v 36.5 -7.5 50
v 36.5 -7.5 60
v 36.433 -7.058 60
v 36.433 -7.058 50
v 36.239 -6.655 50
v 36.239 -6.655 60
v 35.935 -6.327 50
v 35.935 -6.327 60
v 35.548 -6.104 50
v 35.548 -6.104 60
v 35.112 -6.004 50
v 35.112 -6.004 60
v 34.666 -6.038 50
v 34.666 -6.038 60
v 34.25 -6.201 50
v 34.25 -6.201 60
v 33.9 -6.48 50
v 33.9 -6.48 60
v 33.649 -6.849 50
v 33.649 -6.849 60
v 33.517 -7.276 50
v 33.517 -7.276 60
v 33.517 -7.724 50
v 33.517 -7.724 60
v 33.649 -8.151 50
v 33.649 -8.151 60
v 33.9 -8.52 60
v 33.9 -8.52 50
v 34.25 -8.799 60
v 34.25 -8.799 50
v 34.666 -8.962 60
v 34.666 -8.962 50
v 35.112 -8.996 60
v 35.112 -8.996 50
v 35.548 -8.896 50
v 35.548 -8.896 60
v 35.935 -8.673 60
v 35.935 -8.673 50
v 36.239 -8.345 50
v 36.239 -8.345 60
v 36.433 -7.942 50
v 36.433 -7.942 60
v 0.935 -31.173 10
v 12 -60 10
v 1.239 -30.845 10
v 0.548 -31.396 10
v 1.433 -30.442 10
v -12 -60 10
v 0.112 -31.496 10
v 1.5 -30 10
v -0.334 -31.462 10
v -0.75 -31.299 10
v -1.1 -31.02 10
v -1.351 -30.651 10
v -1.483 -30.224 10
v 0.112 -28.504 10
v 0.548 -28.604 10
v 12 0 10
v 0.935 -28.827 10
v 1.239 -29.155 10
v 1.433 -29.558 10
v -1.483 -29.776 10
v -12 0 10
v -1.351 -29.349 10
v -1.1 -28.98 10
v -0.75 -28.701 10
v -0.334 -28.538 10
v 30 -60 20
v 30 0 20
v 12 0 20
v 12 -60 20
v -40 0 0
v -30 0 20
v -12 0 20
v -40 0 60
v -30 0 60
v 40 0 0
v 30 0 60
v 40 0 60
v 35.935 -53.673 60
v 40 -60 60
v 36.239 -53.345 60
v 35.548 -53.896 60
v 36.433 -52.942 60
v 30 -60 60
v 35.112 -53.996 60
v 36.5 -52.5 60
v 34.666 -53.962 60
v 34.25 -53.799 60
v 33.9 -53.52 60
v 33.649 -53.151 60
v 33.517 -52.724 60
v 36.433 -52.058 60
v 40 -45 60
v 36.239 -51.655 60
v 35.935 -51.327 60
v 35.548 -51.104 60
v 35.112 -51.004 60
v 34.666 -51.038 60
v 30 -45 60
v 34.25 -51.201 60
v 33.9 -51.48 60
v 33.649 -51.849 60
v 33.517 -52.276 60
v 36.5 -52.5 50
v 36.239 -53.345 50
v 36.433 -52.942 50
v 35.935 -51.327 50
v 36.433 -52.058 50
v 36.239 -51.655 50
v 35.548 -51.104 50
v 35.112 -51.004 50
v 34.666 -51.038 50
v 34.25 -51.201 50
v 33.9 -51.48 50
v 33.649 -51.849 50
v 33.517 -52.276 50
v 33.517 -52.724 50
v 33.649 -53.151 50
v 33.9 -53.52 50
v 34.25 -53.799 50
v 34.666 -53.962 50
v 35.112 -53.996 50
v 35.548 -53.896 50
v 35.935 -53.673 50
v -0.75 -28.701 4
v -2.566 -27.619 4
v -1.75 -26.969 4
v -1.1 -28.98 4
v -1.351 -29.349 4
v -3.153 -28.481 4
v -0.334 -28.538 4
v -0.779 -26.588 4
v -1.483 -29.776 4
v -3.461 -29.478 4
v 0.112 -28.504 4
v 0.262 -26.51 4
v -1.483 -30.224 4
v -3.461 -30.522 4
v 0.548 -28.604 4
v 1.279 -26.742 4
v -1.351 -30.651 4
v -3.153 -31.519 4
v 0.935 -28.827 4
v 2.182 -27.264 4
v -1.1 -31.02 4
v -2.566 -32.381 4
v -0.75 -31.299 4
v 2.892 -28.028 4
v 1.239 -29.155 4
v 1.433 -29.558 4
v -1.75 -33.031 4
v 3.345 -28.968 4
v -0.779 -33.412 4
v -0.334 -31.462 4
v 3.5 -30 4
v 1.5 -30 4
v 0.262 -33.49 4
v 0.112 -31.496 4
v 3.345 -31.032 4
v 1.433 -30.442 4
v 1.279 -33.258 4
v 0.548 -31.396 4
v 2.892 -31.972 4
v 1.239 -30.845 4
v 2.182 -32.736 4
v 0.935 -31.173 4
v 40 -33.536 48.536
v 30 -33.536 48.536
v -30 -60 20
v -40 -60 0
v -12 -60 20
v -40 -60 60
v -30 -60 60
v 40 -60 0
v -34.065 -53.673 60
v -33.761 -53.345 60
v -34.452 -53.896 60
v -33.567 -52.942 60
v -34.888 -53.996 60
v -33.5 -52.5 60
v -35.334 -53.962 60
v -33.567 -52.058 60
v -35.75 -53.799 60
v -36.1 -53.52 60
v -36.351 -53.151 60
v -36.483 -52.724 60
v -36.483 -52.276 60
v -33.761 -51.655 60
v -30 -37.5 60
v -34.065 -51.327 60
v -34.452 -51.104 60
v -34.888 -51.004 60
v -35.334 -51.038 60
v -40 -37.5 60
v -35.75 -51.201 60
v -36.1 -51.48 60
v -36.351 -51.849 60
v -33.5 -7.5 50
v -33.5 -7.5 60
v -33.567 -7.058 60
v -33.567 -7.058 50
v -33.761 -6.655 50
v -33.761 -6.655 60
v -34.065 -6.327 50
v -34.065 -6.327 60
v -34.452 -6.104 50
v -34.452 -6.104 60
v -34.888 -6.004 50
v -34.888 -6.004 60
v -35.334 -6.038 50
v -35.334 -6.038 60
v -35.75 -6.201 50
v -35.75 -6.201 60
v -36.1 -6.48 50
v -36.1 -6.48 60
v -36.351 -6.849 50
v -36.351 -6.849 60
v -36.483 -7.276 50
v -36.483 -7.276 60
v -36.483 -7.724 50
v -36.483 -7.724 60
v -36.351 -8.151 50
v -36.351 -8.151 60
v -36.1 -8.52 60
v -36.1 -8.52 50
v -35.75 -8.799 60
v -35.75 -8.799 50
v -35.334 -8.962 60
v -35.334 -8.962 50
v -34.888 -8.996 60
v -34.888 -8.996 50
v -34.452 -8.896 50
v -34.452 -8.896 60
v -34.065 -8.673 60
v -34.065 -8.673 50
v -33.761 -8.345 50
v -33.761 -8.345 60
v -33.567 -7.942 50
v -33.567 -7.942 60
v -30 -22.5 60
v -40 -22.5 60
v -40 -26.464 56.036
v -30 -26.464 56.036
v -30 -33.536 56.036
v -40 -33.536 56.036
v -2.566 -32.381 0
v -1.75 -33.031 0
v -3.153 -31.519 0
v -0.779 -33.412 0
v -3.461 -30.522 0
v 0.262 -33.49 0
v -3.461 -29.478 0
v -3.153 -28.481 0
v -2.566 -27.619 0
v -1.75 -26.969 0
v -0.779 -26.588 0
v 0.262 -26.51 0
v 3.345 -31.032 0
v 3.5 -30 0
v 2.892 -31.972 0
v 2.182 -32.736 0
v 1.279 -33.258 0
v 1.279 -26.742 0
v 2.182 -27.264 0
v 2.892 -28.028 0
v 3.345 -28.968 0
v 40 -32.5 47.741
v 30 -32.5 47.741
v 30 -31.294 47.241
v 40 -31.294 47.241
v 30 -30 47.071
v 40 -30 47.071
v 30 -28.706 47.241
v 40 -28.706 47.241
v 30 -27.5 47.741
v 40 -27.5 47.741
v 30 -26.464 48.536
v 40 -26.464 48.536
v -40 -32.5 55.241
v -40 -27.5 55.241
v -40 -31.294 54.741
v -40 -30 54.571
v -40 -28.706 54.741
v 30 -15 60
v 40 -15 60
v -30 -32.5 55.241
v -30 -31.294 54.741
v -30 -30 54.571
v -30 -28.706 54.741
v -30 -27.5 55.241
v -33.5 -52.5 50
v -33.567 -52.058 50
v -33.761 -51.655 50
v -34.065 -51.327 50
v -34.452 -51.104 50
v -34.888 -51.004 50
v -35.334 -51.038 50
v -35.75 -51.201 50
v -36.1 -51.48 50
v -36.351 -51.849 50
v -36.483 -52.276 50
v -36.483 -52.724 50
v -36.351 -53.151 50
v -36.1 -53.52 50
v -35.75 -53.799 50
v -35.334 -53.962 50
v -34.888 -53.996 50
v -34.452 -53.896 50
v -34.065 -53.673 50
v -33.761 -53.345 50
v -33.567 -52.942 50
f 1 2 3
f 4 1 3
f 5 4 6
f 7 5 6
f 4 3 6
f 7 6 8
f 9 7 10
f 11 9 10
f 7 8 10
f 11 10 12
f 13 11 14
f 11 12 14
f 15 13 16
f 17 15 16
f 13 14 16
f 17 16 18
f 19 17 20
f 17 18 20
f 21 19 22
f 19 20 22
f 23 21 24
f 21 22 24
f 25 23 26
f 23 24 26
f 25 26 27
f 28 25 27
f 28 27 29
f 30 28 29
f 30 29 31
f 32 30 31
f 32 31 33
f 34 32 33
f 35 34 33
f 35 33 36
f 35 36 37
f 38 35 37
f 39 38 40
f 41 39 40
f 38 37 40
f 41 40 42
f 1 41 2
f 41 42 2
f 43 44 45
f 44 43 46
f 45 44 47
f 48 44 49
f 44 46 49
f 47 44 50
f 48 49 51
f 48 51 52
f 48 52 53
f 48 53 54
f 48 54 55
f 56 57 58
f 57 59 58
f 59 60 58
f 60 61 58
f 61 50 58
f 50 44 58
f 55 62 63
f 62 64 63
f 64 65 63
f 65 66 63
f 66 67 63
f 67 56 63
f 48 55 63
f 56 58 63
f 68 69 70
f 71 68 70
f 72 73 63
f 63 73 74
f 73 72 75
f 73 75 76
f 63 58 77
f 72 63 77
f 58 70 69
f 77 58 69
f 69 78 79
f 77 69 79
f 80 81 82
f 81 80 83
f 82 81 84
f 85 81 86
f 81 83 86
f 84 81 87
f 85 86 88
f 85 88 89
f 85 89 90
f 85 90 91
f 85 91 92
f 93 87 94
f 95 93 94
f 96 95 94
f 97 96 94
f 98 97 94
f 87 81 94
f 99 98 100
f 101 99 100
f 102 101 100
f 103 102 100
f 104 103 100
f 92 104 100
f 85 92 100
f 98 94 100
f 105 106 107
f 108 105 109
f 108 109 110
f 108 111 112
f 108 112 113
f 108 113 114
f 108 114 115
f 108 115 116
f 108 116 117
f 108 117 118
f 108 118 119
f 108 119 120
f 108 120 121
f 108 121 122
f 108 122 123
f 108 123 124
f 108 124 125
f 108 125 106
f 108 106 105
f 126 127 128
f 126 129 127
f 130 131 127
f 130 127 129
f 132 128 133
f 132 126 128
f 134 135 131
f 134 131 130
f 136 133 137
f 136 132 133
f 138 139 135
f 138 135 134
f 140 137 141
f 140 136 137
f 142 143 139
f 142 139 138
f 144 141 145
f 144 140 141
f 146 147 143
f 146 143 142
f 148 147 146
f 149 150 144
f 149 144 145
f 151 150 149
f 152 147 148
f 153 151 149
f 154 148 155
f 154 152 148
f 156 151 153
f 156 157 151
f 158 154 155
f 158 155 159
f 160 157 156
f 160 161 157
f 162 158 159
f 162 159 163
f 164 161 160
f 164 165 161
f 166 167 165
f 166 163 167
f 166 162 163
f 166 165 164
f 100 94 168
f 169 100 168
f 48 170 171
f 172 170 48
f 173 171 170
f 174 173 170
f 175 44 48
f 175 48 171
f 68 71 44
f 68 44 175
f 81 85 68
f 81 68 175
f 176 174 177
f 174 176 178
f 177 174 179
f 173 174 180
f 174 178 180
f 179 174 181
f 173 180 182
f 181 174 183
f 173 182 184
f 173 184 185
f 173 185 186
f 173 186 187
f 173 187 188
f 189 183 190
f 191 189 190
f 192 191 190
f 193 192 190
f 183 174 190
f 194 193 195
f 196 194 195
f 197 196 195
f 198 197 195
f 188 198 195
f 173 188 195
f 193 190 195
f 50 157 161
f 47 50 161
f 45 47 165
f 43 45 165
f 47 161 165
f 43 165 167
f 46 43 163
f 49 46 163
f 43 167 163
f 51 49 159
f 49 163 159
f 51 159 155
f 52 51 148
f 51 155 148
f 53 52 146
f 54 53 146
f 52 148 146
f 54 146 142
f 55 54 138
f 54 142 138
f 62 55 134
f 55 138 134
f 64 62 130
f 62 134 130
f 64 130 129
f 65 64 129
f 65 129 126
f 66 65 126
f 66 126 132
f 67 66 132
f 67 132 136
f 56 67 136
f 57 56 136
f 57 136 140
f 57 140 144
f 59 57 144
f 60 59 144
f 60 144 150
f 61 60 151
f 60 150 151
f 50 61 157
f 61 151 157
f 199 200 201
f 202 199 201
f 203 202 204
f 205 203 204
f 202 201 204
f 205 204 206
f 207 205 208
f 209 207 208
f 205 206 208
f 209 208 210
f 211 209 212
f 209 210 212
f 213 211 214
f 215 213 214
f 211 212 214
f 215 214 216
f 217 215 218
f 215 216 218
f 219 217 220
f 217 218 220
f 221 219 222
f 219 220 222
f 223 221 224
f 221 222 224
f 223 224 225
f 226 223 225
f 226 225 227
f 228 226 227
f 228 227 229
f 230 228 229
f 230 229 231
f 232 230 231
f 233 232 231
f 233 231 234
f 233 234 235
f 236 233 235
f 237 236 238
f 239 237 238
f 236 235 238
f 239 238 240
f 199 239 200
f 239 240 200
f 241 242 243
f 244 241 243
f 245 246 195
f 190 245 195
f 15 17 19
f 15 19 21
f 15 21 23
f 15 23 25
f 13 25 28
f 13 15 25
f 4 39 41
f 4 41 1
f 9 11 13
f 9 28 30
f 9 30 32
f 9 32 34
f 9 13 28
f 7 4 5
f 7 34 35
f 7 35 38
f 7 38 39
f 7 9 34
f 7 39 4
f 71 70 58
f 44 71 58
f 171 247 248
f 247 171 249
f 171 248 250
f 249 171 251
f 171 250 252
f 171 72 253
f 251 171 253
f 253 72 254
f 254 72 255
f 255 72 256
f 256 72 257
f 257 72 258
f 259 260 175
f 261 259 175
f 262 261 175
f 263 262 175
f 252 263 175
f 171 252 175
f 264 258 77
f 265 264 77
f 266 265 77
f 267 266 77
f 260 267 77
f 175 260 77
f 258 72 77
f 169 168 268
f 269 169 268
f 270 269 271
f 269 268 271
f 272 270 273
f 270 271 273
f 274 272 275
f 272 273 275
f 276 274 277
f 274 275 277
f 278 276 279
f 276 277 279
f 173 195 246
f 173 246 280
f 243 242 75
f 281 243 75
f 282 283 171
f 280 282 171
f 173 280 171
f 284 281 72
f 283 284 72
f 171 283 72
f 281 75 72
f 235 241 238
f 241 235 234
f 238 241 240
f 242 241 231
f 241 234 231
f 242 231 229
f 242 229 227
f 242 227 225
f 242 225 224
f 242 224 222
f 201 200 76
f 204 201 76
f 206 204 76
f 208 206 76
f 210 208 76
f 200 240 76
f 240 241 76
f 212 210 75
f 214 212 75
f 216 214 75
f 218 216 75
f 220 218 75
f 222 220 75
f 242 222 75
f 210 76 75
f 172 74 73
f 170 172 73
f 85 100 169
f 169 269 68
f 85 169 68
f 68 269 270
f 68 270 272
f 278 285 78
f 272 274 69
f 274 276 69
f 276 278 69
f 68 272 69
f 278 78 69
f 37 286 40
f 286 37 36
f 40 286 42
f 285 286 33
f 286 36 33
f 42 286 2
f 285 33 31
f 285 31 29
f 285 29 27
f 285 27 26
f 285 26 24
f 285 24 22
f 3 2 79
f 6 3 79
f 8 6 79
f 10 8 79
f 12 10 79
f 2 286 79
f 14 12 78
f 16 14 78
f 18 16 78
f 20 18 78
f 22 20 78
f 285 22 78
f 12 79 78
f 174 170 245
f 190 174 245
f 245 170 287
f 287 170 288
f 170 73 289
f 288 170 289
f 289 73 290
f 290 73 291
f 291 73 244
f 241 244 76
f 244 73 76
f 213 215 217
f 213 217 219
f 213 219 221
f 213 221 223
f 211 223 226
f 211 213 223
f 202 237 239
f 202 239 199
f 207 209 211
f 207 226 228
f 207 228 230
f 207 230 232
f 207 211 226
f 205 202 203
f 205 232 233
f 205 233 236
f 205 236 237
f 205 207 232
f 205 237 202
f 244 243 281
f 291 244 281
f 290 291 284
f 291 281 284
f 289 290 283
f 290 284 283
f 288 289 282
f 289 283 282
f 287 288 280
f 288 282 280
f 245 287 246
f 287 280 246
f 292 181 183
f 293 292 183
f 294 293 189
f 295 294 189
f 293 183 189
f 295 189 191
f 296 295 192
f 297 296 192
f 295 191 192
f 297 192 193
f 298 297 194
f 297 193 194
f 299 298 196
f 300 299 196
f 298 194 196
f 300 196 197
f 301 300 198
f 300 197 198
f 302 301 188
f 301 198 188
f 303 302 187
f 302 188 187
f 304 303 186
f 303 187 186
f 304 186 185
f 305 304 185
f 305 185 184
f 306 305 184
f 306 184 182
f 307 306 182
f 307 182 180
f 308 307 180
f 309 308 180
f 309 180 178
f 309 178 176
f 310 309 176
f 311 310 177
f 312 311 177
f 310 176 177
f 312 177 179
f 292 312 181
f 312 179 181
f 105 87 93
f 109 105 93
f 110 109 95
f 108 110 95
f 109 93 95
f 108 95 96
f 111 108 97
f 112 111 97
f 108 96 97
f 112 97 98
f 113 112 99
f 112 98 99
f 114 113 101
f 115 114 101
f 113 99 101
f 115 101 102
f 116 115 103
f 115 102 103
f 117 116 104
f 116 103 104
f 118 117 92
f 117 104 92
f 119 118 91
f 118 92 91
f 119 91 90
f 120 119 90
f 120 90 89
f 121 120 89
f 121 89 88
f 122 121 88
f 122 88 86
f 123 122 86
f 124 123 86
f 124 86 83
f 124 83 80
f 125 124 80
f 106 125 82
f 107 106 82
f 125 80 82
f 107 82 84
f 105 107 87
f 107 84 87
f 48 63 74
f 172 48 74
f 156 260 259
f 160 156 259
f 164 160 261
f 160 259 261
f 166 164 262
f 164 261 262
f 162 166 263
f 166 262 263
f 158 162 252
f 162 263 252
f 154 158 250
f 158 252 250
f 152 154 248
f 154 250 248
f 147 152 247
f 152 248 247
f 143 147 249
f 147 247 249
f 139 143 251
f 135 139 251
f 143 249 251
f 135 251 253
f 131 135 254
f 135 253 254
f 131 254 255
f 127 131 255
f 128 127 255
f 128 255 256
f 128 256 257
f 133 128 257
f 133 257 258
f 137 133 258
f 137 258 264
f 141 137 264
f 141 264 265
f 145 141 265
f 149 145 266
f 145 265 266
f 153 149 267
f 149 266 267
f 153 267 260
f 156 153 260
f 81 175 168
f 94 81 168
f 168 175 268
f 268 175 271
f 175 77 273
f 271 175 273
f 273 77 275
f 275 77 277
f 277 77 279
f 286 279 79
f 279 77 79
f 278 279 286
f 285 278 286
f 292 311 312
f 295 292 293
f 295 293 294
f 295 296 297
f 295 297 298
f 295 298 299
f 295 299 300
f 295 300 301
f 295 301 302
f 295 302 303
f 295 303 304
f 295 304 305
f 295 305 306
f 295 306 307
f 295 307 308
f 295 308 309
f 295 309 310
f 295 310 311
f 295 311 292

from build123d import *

# Parameters (mm, degrees)
F1_DEPTH  = 60
F3_DEPTH  = 10
F5_DEPTH  = 10
F6_R      = 1.5
F7_R      = 1.5
F8_R      = 1.5
F9_R      = 1.5
F10_DEPTH = 10
F11_R     = 3.5
F12_DEPTH = 4
F13_R     = 1.5
F14_DEPTH = 6


# Not quite as in the source:
# - a feature names something its author has since deleted; it is built from what else it names


with BuildPart() as f1:
    # F0 (on Front) → F1 (new body)
    with BuildSketch(Plane.XZ):
        Polygon((-40, 60), (-40, 0), (40, 0), (40, 60), (30, 60), (30, 20), (12, 20), (12, 10), (-12, 10), (-12, 20), (-30, 20), (-30, 60), align=None)
    extrude(amount=F1_DEPTH)

    # F2 (on face) → F3 (cut, through all)
    with BuildSketch(Plane.YZ.offset(40)):
        with BuildLine():
            ThreePointArc((-33.5355339059, 48.5355339059), (-30, 47.0710678119), (-26.4644660941, 48.5355339059))
            Line((-26.4644660941, 48.5355339059), (-15, 60))
            Line((-15, 60), (-45, 60))
            Line((-45, 60), (-33.5355339059, 48.5355339059))
        make_face()
    extrude(amount=-F3_DEPTH, mode=Mode.SUBTRACT)

    # F4 (on face) → F5 (cut, through all)
    with BuildSketch(Plane(origin=(-40, 0, 0), x_dir=(0, -1, 0), z_dir=(-1, 0, 0))):
        with BuildLine():
            Line((37.5, 60), (22.5, 60))
            Line((22.5, 60), (26.4644660941, 56.0355339059))
            ThreePointArc((26.4644660941, 56.0355339059), (30, 54.5710678119), (33.5355339059, 56.0355339059))
            Line((33.5355339059, 56.0355339059), (37.5, 60))
        make_face()
    extrude(amount=-F5_DEPTH, mode=Mode.SUBTRACT)

    # F6 (on face) + F7 (on face) + F8 (on face) + F9 (on face) → F10 (cut)
    with BuildSketch(Plane.XY.offset(60)):
        with Locations((-35, -7.5)):
            Circle(F6_R)
    with BuildSketch(Plane.XY.offset(60)):
        with Locations((-35, -52.5)):
            Circle(F7_R)
    with BuildSketch(Plane.XY.offset(60)):
        with Locations((35, -7.5)):
            Circle(F8_R)
    with BuildSketch(Plane.XY.offset(60)):
        with Locations((35, -52.5)):
            Circle(F9_R)
    extrude(amount=-F10_DEPTH, mode=Mode.SUBTRACT)

    # F11 (on face) → F12 (cut)
    with BuildSketch(Plane(origin=(0, 0, 0), x_dir=(1, 0, 0), z_dir=(0, 0, -1))):
        with Locations((0, 30)):
            Circle(F11_R)
    extrude(amount=-F12_DEPTH, mode=Mode.SUBTRACT)

    # F13 (on face) → F14 (cut, through all)
    with BuildSketch(Plane(origin=(0, 0, 4), x_dir=(1, 0, 0), z_dir=(0, 0, -1))):
        with Locations((0, 30)):
            Circle(F13_R)
    extrude(amount=-F14_DEPTH, mode=Mode.SUBTRACT)


solid = f1.part
